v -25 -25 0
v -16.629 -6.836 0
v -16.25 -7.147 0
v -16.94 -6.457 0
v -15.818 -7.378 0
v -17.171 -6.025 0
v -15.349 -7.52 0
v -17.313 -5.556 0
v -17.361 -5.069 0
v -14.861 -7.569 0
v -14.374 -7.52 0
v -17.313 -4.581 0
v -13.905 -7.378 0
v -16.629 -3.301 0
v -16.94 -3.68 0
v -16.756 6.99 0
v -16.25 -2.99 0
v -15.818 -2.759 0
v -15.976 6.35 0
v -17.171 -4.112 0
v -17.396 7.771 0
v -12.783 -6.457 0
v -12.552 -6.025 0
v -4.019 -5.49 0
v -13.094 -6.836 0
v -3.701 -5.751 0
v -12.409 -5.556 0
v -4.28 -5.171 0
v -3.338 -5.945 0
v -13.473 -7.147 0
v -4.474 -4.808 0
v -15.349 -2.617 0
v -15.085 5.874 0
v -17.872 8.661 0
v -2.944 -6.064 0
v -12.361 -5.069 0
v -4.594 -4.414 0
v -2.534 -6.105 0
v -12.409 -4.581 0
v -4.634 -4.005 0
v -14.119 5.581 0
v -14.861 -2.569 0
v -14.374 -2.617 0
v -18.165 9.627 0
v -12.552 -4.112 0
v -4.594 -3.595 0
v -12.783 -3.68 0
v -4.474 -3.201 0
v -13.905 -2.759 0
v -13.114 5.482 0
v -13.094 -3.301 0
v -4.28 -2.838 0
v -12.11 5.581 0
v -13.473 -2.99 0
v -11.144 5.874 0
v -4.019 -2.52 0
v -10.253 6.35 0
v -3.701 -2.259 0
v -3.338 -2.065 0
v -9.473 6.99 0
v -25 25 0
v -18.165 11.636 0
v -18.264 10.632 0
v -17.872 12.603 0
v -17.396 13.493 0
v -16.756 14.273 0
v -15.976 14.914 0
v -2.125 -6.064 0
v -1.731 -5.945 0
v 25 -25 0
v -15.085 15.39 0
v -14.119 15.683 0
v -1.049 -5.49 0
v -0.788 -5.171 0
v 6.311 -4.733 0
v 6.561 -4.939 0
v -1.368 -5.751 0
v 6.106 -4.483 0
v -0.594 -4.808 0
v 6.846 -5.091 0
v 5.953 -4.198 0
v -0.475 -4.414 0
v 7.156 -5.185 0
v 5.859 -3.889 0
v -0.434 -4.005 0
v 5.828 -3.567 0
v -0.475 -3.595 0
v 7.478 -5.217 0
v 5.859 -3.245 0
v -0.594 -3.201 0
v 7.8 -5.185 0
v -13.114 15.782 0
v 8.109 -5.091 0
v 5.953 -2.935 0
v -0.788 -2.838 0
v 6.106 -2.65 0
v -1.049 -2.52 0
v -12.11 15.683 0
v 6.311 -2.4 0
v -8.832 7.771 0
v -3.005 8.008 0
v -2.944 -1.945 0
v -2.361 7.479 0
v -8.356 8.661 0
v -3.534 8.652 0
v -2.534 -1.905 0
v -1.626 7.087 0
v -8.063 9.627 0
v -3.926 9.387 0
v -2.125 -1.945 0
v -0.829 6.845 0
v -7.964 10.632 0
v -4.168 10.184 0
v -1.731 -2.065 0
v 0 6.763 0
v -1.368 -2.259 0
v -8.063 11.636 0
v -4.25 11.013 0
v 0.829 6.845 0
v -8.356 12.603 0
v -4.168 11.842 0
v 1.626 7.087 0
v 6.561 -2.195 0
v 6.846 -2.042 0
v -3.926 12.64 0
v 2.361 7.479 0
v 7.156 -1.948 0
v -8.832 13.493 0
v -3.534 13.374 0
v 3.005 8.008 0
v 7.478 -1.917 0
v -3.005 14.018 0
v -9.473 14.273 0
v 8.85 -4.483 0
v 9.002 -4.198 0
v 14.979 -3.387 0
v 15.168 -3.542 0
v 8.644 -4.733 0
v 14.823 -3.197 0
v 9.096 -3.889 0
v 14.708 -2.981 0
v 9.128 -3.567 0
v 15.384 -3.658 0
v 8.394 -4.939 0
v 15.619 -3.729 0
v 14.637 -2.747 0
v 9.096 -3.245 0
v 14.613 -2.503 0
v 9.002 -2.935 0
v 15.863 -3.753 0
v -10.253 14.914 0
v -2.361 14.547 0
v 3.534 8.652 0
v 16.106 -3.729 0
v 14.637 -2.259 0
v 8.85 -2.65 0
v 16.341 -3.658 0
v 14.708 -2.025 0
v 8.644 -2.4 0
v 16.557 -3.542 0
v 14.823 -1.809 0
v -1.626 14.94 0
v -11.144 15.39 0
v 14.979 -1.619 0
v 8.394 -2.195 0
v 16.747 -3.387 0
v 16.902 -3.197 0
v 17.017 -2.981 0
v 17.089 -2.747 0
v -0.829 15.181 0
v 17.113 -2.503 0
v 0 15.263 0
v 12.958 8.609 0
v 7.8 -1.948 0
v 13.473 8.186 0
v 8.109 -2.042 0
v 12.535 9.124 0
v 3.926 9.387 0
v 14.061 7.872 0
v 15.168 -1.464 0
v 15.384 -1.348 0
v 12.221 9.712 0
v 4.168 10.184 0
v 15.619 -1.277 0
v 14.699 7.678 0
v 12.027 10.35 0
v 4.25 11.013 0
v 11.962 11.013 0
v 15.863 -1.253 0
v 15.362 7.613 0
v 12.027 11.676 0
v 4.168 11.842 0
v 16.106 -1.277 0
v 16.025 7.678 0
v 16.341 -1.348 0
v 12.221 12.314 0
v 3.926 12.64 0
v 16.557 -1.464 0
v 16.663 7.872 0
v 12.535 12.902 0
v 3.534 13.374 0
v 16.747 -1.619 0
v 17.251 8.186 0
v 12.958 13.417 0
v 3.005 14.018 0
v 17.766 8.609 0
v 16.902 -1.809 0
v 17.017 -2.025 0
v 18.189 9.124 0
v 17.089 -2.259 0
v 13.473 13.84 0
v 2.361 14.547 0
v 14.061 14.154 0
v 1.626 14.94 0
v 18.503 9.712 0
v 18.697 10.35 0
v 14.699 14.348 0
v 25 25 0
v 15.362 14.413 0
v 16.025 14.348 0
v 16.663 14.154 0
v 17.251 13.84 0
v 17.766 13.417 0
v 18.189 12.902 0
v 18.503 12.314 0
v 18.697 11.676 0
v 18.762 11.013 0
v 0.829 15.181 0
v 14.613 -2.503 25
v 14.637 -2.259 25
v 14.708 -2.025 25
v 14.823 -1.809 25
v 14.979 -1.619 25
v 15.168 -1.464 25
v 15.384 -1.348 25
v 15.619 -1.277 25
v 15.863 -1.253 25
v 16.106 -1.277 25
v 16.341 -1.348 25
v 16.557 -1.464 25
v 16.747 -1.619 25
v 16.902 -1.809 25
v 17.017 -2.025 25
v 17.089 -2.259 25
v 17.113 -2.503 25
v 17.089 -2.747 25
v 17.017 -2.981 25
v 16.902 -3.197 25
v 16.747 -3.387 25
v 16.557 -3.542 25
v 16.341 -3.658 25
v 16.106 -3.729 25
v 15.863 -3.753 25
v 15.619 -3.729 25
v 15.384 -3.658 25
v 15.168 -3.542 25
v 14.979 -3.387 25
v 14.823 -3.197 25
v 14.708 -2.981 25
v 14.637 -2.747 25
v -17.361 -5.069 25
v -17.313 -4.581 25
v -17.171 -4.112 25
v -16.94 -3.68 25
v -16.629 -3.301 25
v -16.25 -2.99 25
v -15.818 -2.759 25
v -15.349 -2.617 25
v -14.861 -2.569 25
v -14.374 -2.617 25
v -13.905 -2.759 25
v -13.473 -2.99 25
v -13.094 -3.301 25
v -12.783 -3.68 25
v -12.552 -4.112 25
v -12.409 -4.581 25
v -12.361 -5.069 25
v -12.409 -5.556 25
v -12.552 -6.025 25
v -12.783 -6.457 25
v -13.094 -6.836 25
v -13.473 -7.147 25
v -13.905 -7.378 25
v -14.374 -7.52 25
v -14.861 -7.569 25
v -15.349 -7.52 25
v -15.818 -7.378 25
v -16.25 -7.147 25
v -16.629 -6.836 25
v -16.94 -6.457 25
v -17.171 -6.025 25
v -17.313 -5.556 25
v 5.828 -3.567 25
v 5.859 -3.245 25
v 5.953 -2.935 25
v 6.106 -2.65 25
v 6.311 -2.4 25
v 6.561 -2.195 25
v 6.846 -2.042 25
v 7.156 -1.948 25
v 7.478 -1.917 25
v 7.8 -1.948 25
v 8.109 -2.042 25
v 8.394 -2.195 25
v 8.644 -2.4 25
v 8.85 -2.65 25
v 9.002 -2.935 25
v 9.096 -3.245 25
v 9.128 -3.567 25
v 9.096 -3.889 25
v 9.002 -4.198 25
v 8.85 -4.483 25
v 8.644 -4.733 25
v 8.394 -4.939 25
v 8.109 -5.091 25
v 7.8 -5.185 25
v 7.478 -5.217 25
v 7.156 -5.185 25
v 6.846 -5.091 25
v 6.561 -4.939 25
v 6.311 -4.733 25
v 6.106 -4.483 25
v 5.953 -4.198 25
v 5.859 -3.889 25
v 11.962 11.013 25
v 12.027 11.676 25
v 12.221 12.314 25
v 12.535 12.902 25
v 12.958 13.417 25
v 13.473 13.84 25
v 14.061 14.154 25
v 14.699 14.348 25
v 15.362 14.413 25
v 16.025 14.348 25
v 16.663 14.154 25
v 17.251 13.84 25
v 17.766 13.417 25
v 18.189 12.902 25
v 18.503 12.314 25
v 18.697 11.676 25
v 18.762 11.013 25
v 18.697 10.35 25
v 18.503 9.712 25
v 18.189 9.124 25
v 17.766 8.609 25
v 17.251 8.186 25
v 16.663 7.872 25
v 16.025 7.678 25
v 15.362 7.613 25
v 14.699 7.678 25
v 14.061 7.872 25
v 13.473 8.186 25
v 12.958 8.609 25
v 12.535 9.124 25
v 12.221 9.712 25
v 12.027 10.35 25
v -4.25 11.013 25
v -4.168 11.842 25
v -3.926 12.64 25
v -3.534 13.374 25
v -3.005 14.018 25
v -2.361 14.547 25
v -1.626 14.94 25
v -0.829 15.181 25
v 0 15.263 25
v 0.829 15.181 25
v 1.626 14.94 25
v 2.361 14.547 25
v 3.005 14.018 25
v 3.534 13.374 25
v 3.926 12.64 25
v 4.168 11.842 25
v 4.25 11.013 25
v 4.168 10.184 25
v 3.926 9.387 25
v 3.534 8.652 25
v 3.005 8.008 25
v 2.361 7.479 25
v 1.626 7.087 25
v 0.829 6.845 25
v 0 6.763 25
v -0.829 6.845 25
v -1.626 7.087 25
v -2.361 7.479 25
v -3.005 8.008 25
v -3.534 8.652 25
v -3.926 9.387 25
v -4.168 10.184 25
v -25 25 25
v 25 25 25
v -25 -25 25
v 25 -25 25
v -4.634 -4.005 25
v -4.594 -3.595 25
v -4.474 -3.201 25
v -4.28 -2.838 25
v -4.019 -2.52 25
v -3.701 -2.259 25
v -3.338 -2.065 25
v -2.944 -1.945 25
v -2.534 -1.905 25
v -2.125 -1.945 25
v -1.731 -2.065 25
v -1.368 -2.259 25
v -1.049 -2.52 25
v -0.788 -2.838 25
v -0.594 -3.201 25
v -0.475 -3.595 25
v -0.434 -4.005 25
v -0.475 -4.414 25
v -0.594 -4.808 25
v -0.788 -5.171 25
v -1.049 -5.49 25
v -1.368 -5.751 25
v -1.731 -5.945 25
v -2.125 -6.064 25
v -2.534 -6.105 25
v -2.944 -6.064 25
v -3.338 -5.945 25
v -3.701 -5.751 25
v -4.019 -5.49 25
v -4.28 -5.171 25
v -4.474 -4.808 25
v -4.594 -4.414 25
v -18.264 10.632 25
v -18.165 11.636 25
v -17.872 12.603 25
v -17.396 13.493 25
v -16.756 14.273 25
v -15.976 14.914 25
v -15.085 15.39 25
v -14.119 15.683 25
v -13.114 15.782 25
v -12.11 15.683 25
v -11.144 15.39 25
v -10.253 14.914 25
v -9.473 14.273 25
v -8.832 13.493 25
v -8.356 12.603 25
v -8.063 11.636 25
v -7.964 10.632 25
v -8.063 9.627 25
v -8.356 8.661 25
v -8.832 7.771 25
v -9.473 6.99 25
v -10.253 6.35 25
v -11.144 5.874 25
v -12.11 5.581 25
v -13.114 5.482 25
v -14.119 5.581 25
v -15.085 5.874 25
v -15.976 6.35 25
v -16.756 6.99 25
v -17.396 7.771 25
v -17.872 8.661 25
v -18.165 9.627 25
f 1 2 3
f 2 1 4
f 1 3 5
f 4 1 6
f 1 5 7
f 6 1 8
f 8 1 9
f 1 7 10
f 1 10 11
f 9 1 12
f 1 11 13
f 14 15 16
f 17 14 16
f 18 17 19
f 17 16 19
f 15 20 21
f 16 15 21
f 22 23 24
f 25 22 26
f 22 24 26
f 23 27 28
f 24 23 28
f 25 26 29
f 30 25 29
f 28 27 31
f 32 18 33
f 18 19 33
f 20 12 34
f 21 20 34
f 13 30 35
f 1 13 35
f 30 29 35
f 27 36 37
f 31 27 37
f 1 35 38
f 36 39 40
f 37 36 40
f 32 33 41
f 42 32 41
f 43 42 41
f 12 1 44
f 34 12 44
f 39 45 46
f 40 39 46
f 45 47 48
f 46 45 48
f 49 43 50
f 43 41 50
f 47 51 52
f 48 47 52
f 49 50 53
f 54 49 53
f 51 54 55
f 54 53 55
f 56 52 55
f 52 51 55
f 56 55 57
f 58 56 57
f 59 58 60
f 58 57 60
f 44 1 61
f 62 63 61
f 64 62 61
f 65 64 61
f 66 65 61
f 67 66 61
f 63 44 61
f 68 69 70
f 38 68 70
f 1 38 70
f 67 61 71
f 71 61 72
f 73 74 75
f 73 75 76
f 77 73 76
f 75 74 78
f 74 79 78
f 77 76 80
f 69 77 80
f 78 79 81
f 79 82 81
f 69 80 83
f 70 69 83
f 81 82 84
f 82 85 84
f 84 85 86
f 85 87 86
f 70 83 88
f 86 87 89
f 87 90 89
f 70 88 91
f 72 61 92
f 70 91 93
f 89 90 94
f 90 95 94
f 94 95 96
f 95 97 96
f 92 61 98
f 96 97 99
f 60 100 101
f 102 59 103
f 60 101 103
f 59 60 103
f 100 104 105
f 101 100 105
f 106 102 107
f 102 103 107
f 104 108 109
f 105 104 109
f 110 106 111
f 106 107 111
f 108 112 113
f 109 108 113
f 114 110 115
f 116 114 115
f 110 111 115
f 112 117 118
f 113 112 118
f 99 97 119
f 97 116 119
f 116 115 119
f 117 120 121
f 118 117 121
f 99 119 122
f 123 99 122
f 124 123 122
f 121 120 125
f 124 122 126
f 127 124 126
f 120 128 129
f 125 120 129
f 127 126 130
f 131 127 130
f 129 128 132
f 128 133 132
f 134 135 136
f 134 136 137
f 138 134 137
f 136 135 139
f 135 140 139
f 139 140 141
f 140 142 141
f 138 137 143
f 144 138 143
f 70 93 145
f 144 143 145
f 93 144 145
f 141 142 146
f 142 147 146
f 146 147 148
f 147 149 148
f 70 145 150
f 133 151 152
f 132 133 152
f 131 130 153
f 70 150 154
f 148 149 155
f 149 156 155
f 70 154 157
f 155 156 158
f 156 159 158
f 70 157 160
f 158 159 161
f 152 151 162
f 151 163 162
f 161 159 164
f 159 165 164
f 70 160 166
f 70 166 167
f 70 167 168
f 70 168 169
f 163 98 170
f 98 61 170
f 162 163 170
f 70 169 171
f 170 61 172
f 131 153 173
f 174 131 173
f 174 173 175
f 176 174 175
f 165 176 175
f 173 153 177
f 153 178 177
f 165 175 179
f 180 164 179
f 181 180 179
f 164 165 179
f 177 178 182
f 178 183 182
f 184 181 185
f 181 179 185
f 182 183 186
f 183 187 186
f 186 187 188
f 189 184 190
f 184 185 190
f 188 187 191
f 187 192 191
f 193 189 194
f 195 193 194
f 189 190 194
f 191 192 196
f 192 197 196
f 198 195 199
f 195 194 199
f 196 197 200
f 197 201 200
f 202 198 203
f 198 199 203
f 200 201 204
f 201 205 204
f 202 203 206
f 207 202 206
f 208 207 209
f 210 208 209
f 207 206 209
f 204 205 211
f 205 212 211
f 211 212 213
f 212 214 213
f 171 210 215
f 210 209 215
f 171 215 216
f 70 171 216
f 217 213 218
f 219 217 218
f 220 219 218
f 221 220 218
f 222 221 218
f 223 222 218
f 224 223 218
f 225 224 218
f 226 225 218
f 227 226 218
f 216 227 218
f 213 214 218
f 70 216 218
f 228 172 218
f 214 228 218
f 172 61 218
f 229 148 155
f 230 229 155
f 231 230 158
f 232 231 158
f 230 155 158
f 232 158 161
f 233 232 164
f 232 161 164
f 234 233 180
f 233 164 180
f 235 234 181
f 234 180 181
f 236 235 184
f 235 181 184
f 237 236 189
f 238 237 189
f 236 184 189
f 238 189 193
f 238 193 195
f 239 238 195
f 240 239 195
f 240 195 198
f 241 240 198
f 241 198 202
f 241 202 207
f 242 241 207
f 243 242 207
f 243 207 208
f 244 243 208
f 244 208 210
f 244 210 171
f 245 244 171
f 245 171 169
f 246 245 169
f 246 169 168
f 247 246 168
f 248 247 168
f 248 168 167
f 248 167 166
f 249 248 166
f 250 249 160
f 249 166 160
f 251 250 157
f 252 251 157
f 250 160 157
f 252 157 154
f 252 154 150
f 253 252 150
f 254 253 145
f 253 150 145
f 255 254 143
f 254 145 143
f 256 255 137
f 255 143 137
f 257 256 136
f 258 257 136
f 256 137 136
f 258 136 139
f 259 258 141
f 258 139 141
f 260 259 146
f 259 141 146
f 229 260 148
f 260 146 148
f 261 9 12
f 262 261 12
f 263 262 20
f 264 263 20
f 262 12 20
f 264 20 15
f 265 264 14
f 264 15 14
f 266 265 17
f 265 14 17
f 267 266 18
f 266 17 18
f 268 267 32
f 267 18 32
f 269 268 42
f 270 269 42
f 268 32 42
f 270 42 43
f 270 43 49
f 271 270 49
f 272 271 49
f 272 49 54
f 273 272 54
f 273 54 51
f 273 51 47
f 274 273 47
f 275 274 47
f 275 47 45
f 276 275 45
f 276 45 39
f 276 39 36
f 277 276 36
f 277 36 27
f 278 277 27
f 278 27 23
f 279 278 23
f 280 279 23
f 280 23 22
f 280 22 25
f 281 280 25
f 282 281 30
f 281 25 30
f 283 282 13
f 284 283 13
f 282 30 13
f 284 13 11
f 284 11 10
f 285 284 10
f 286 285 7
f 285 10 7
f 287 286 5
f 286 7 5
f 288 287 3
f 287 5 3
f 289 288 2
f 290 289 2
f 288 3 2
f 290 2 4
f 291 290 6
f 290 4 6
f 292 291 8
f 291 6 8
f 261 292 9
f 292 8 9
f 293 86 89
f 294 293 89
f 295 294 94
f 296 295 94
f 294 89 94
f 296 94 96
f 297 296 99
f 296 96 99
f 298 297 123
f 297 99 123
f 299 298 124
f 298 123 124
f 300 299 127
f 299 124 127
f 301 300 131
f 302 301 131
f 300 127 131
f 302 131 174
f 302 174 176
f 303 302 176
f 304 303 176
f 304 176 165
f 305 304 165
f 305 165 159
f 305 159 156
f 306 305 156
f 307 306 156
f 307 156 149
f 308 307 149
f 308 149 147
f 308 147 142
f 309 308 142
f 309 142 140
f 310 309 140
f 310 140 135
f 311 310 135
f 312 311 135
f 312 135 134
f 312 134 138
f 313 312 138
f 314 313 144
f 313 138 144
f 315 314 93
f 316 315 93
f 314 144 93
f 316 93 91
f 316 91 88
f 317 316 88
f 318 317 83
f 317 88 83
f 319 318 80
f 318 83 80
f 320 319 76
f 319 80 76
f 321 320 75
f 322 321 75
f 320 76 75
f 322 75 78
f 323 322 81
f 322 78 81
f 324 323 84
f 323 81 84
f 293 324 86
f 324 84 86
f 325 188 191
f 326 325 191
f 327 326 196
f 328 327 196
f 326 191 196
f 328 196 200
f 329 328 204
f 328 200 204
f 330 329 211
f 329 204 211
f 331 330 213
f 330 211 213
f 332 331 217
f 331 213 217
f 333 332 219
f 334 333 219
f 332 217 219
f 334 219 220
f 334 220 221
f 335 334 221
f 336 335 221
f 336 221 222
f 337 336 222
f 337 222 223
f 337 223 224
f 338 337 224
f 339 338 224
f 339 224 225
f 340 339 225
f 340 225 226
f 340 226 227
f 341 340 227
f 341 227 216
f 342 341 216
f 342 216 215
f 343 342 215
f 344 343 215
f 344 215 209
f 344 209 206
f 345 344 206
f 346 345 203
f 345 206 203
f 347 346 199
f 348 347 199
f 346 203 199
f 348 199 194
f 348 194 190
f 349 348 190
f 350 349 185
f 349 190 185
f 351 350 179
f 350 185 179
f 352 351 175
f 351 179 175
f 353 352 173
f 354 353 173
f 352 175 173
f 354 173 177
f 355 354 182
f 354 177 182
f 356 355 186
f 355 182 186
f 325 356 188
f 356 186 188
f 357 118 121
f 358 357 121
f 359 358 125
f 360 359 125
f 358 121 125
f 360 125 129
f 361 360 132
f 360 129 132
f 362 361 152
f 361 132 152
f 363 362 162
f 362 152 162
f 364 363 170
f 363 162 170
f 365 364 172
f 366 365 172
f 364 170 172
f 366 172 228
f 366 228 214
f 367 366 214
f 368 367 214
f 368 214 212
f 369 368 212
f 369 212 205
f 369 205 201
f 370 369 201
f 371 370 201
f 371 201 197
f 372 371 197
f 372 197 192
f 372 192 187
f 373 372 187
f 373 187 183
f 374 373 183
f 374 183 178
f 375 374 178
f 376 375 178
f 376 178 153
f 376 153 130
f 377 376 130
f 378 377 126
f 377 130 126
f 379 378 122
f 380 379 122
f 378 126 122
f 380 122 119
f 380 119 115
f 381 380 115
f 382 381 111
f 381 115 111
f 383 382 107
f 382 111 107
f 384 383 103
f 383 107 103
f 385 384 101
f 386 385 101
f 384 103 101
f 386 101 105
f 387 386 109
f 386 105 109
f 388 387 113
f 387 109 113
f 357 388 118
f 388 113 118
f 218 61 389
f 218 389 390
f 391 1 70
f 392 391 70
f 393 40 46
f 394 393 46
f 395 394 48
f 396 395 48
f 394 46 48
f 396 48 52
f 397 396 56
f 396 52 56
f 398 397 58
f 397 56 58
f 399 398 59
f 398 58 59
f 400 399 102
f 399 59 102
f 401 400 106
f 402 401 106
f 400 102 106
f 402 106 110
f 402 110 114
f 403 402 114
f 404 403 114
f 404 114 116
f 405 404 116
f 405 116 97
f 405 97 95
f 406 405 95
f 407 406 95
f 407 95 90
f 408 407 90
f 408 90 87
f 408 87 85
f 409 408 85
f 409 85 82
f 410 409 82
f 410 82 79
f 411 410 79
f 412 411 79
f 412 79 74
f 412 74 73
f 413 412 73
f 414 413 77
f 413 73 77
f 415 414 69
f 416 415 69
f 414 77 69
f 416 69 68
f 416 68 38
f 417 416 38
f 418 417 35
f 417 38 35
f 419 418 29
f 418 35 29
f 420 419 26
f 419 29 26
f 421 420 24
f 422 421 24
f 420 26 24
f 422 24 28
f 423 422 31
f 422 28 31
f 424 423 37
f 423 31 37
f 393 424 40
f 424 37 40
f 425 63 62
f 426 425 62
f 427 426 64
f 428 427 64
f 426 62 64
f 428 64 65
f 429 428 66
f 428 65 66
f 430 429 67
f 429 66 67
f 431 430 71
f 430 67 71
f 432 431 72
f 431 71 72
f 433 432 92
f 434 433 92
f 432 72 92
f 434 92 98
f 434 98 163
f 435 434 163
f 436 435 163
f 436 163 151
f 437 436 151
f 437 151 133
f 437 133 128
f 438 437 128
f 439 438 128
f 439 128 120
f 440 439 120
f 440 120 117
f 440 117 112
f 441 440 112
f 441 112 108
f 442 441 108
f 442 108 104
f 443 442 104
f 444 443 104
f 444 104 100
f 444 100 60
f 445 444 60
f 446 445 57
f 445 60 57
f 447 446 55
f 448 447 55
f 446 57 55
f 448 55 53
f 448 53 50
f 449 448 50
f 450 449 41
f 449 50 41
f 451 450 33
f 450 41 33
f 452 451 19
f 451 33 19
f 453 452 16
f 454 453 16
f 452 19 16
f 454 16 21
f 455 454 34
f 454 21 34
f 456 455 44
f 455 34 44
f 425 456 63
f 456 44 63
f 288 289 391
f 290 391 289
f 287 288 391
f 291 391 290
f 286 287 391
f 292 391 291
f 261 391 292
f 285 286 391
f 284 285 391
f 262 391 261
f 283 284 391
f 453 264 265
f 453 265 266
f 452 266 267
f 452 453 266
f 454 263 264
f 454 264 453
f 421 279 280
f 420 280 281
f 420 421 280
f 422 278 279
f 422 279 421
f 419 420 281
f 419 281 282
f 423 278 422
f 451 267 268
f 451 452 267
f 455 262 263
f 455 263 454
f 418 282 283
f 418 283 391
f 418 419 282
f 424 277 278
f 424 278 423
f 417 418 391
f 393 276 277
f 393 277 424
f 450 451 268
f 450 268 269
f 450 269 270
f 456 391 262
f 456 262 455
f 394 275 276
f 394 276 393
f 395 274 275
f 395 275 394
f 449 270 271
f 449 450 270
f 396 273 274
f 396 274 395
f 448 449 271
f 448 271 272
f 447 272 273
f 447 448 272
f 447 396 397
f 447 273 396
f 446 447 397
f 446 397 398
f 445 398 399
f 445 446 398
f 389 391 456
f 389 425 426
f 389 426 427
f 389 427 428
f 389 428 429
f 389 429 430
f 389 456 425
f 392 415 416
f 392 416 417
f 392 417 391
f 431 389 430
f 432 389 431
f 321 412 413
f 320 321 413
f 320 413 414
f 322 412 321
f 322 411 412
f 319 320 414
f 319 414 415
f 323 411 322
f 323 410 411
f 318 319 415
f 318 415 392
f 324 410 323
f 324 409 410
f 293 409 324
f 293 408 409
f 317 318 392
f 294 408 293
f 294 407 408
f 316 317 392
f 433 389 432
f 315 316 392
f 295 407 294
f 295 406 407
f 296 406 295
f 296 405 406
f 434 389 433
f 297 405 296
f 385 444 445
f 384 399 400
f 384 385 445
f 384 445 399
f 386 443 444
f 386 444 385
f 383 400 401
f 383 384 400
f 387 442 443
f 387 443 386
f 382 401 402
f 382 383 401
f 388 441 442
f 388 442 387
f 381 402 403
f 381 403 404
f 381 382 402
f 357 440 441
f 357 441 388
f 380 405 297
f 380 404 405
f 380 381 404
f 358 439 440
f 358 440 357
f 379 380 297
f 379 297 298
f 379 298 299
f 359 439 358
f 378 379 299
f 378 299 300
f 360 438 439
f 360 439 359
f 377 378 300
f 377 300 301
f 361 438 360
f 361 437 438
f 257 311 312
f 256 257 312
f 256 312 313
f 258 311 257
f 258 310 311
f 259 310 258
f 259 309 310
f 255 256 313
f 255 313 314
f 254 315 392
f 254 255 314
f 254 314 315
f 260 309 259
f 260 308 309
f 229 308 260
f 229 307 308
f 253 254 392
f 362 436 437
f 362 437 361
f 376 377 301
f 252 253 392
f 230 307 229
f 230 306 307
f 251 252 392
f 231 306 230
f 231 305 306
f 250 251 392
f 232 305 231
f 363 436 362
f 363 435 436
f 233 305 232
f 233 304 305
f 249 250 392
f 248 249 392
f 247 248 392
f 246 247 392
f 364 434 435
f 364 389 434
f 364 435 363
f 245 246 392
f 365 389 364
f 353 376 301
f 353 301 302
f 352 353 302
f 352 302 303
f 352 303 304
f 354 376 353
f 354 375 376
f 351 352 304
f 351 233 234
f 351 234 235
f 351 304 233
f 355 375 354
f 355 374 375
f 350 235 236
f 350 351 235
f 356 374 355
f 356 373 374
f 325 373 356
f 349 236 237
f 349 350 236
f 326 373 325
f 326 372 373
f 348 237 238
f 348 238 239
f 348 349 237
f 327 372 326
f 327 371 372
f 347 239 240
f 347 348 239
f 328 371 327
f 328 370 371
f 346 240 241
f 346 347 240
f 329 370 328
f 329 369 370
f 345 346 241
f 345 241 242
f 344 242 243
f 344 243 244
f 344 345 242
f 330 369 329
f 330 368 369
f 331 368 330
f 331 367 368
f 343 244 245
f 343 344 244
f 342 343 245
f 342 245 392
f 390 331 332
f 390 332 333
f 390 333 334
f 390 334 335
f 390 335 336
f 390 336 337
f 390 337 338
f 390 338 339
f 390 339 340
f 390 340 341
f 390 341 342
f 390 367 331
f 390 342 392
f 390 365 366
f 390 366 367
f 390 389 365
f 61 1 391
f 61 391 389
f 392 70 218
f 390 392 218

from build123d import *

# Parameters (mm, degrees)
F0_W     = 50
F0_H     = 50
F1_DEPTH = 25
F3_D     = 10.3
F4_D     = 8.5
F5_D     = 6.8
F6_D     = 5
F7_D     = 4.2
F8_D     = 3.3
F9_D     = 2.5


with BuildPart() as f1:
    # F0 (on Top) → F1 (new body)
    with BuildSketch(Plane.XY):
        Rectangle(F0_W, F0_H)
    extrude(amount=F1_DEPTH)

    # F3 (through all)
    with Locations(Plane.XY.offset(25)):
        with Locations((-13.114403002, 10.6317354366)):
            Hole(F3_D / 2)

    # F4 (through all)
    with Locations(Plane.XY.offset(25)):
        with Locations((0, 11.0131110996)):
            Hole(F4_D / 2)

    # F5 (through all)
    with Locations(Plane.XY.offset(25)):
        with Locations((15.3620382771, 11.0131110996)):
            Hole(F5_D / 2)

    # F6 (through all)
    with Locations(Plane.XY.offset(25)):
        with Locations((-14.8614421487, -5.0685340539)):
            Hole(F6_D / 2)

    # F7 (through all)
    with Locations(Plane.XY.offset(25)):
        with Locations((-2.5342670269, -4.0047676302)):
            Hole(F7_D / 2)

    # F8 (through all)
    with Locations(Plane.XY.offset(25)):
        with Locations((7.4776518159, -3.5667461343)):
            Hole(F8_D / 2)

    # F9 (through all)
    with Locations(Plane.XY.offset(25)):
        with Locations((15.8626344055, -2.5029797107)):
            Hole(F9_D / 2)


solid = f1.part
